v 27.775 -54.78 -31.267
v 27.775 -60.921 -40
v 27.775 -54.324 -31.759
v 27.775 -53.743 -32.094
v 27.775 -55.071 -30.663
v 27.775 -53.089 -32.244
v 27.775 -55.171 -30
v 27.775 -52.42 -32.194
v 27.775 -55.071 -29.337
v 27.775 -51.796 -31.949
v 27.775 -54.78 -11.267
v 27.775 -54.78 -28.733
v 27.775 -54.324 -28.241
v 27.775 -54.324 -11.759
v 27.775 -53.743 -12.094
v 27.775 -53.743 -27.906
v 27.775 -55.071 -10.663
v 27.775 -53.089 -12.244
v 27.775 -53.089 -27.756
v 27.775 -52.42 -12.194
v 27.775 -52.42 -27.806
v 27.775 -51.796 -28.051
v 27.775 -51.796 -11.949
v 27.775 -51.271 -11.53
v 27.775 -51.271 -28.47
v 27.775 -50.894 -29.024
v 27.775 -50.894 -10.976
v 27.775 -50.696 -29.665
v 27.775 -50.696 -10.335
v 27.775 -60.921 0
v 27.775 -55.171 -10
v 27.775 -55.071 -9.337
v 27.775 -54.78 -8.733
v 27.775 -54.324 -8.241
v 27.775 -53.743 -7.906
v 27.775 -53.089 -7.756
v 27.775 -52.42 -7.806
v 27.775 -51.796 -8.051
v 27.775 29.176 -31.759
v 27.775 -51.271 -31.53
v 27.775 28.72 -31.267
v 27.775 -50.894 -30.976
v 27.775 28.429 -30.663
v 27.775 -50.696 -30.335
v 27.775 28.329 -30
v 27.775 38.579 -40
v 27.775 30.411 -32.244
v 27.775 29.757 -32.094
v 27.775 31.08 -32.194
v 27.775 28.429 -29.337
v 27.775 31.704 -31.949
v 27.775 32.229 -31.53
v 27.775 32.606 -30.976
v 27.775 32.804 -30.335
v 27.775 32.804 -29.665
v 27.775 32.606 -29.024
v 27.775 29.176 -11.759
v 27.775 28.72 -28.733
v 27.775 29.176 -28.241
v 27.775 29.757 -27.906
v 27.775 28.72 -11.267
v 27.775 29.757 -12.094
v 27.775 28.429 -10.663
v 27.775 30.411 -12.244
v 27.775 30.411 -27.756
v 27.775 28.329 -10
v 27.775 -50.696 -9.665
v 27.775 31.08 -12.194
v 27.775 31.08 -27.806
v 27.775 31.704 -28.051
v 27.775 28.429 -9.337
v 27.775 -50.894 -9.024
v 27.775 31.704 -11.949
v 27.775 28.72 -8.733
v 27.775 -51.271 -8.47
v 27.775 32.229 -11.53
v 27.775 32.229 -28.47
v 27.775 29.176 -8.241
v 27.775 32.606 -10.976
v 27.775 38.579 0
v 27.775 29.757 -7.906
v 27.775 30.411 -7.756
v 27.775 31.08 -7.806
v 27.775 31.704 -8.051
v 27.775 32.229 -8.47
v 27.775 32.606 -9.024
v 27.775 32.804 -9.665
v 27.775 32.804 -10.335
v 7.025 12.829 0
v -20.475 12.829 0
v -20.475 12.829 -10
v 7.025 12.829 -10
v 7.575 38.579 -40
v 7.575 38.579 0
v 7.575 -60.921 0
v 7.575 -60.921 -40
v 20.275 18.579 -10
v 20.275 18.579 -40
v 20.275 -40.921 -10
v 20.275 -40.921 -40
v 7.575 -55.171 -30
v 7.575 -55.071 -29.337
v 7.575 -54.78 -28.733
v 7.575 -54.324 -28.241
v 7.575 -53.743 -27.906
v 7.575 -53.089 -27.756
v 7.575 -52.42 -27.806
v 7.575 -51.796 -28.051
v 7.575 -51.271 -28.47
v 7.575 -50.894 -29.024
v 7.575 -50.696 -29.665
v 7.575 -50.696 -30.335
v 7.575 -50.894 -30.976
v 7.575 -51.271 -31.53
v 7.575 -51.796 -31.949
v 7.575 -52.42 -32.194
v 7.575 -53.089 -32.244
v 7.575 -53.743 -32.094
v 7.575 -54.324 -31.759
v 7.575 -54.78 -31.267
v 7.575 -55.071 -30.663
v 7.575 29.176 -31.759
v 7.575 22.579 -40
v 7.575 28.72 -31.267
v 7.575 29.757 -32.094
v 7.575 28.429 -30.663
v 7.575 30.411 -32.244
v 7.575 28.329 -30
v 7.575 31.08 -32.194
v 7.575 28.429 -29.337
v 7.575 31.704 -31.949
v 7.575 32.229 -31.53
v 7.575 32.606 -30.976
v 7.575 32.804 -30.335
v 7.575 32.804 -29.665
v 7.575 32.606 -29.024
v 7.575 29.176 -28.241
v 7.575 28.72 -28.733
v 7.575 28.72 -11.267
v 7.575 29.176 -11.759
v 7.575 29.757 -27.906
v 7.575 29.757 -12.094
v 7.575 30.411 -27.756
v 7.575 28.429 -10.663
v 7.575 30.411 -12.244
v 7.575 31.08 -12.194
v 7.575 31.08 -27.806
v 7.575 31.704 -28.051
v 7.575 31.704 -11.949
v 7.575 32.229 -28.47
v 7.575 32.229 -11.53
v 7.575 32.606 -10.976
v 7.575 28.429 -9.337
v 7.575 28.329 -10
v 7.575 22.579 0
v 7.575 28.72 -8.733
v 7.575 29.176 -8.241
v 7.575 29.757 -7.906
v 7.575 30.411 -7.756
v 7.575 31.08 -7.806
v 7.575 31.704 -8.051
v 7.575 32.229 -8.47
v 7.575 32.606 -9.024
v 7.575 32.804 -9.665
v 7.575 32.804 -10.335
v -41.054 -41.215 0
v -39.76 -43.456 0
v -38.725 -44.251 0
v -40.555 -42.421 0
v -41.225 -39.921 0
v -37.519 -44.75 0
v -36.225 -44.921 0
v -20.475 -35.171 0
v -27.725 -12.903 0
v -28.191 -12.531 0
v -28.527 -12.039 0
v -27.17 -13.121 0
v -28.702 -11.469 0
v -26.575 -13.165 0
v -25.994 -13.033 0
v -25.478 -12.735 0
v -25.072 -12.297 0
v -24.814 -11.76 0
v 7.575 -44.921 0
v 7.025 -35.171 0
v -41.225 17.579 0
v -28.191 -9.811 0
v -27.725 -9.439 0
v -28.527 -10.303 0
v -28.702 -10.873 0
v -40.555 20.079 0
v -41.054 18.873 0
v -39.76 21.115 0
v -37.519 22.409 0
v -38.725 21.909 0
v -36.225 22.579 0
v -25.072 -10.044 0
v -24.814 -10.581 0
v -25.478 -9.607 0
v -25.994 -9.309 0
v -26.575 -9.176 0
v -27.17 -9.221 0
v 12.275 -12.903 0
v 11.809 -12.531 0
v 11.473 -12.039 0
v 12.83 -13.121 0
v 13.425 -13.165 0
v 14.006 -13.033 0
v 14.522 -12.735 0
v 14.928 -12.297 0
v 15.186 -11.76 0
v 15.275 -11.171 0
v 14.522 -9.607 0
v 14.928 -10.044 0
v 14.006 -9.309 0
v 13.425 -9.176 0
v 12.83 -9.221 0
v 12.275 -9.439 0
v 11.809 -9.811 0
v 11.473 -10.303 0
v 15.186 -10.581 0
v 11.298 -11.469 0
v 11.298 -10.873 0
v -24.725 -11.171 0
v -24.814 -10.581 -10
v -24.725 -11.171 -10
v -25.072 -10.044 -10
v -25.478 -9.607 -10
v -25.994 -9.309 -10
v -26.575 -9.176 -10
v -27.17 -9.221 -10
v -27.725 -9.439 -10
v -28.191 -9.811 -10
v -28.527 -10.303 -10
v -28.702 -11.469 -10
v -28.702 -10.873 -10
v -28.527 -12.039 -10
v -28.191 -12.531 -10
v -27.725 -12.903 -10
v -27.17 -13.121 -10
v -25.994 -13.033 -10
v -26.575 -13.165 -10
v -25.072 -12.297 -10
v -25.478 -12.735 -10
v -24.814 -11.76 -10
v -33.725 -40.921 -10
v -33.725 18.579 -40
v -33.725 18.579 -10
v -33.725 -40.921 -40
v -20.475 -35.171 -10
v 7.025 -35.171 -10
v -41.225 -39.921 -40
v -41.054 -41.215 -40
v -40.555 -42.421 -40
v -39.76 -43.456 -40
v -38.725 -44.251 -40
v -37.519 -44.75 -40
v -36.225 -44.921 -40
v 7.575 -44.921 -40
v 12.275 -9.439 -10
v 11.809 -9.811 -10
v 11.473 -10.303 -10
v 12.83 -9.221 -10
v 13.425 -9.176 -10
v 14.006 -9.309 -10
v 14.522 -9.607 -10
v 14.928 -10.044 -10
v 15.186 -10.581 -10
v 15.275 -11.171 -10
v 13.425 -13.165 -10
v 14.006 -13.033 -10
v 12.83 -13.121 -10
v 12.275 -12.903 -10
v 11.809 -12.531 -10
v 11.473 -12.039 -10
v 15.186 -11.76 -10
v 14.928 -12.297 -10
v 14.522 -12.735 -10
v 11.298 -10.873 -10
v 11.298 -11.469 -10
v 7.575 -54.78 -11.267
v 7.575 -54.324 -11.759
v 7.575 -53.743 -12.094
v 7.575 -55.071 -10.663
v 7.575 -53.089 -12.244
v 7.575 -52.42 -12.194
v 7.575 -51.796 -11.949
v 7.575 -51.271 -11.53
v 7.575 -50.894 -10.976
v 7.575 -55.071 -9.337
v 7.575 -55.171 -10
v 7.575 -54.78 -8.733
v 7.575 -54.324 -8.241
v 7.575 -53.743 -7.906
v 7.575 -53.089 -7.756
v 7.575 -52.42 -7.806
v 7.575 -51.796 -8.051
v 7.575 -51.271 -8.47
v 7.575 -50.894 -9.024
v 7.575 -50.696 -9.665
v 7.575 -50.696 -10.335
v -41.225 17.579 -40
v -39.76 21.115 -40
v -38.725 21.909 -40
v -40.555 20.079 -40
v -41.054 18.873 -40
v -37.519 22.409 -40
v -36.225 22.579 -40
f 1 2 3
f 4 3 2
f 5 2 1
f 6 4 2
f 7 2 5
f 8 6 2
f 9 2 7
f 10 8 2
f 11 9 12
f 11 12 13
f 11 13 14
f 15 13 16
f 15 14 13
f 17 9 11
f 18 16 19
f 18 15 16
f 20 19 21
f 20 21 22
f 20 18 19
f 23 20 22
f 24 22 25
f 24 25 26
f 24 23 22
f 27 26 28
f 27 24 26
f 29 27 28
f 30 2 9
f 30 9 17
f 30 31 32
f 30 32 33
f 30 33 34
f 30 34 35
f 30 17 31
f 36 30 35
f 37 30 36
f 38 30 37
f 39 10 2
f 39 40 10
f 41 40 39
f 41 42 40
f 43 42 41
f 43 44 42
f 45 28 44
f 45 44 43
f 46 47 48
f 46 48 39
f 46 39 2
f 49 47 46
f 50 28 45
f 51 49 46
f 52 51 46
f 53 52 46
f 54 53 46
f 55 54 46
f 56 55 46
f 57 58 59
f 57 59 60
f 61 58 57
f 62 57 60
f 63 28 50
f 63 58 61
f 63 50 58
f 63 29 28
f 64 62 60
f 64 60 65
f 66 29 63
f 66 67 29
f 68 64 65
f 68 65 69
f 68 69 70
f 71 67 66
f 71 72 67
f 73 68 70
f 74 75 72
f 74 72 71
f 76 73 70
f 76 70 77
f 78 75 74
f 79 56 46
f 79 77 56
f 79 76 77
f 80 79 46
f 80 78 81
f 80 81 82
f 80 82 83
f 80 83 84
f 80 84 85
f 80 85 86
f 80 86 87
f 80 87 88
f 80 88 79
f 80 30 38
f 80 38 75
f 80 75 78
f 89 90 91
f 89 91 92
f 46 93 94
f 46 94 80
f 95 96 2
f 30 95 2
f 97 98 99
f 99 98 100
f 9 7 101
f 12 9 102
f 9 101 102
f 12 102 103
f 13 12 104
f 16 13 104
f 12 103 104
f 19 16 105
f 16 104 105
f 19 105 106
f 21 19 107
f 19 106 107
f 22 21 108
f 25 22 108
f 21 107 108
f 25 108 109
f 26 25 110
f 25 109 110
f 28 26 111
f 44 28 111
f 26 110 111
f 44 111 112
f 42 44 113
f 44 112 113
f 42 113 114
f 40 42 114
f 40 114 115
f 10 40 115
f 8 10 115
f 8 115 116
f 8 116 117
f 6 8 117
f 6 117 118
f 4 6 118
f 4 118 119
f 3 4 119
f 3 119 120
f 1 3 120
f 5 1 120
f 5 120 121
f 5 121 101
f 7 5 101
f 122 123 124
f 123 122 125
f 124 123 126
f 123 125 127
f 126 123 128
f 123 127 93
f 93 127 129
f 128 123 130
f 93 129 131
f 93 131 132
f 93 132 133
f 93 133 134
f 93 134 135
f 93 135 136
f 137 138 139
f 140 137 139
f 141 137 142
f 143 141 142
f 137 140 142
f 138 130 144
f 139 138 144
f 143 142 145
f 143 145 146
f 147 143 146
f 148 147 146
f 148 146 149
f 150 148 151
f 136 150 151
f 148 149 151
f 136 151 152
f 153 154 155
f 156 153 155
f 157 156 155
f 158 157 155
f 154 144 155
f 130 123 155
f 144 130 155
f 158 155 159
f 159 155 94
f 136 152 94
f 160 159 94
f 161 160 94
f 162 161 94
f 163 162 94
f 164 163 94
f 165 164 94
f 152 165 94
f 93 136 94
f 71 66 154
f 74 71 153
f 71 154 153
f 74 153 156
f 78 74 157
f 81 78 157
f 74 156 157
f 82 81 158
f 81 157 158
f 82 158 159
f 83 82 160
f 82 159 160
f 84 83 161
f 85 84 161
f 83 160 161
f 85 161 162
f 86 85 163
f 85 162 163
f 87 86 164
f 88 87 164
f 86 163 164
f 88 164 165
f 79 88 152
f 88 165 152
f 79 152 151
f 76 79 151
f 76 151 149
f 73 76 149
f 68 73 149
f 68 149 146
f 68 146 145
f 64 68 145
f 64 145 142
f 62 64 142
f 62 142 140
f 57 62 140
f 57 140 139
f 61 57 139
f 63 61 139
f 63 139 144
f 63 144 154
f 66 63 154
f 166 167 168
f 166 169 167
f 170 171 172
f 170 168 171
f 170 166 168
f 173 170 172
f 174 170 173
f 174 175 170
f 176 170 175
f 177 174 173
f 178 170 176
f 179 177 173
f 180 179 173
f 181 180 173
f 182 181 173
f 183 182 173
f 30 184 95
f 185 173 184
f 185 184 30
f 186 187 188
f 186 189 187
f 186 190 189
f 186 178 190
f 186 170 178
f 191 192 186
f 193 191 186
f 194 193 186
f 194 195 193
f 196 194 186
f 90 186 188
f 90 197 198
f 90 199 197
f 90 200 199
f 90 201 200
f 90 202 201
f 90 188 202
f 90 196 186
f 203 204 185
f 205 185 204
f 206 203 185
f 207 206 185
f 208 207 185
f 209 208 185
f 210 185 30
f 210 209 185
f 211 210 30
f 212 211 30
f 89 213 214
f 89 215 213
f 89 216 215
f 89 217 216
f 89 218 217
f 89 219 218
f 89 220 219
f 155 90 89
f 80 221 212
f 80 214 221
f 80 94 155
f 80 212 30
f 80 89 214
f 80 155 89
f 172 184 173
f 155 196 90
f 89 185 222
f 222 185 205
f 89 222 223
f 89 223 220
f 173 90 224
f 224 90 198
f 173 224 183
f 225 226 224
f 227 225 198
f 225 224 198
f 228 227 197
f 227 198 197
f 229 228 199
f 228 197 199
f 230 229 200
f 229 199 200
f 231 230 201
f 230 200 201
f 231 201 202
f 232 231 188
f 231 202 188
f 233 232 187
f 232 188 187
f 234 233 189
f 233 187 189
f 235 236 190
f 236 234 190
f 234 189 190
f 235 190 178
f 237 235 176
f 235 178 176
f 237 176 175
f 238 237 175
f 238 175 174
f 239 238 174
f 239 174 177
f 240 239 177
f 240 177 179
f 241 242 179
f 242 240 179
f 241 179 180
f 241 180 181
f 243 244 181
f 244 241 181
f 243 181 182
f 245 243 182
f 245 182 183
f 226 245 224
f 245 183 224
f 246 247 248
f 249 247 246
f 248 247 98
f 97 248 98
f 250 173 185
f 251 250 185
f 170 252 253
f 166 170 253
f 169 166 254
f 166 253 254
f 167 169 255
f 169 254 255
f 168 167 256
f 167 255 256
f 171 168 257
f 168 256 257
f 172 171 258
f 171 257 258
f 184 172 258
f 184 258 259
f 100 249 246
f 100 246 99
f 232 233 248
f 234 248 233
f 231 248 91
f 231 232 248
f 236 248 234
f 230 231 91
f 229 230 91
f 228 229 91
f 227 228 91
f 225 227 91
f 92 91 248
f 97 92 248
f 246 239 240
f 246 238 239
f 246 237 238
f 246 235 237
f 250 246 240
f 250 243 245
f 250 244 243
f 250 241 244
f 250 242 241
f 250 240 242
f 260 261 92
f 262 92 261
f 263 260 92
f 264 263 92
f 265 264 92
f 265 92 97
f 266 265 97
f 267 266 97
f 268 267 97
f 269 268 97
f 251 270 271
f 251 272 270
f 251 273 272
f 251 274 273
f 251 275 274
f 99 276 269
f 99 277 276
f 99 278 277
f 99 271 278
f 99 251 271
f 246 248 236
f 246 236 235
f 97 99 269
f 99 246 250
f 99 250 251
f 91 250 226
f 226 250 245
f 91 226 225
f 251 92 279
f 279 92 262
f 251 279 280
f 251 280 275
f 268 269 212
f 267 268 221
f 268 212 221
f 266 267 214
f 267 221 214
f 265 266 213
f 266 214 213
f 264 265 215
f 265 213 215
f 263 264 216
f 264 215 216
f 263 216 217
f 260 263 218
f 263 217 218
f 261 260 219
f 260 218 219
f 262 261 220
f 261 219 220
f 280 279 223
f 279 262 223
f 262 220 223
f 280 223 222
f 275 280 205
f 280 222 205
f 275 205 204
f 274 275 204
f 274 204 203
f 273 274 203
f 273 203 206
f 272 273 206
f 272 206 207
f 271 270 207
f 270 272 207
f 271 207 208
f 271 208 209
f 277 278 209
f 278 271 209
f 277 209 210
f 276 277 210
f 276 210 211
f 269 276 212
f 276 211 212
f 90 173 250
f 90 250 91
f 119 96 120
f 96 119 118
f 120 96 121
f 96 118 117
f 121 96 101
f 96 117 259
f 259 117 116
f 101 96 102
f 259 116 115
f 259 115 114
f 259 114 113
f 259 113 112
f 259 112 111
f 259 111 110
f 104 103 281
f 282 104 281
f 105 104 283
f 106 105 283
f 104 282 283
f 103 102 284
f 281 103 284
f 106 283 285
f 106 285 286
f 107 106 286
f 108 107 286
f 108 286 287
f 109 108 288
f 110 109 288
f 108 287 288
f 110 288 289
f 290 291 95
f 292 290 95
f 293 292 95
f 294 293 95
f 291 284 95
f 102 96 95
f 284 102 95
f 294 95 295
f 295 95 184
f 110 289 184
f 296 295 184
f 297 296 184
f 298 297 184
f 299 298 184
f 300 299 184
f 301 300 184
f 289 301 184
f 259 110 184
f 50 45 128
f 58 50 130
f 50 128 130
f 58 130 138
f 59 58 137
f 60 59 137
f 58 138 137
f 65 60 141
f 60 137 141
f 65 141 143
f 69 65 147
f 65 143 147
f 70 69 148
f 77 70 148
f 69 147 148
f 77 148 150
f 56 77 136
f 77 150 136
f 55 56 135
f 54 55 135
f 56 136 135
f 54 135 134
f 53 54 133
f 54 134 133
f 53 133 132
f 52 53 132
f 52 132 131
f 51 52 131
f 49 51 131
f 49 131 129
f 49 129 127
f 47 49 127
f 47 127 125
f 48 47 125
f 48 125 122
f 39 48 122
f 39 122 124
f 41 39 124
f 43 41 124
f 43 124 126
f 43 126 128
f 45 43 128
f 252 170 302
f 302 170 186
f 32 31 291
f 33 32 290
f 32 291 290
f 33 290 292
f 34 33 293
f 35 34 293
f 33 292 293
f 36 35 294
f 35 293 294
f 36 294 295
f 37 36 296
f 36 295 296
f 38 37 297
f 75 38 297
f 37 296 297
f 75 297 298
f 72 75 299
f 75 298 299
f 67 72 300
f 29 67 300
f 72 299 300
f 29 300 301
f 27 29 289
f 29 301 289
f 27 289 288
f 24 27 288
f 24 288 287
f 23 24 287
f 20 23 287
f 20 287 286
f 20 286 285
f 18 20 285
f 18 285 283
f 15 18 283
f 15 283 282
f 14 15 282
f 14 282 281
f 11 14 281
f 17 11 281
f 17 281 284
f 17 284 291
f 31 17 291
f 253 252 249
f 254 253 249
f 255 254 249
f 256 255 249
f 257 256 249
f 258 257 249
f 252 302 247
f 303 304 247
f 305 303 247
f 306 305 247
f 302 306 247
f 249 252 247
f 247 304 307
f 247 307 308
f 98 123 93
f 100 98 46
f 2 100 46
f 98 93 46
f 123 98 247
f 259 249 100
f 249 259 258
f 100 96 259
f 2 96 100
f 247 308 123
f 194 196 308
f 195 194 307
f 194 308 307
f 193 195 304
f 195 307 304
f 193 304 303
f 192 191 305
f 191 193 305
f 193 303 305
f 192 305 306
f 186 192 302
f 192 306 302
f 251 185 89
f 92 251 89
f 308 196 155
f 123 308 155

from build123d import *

# Parameters (mm, degrees)
F0_R      = 2
F0_W      = 27.5
F0_H      = 48
F1_DEPTH  = 1
F0_W_2    = 69
F0_H_2    = 99.5
F2_DEPTH  = 40
F3_W      = 54
F3_H      = 59.5
F3_R      = 2
F3_W_2    = 27.5
F3_H_2    = 48
F4_DEPTH  = 30
F5_W      = 48.8
F5_H      = 16
F6_DEPTH  = 40.001
F7_R      = 2.25
F8_DEPTH  = 20.201
F9_DEPTH  = 1
F11_DEPTH = 40.001


with BuildPart() as f1:
    # F0 (on Top) → F1 (new body)
    with BuildSketch(Plane.XY):
        Polygon((7.5751999344, 18.5791517273), (-21.0248000656, 18.5791517273), (-31.2248000656, -11.1708482727), (-21.0248000656, -40.9208482727), (7.5751999344, -40.9208482727), (17.7751999344, -11.1708482727), align=None)
        with Locations((-26.7248000656, -11.1708482727)):
            Circle(F0_R, mode=Mode.SUBTRACT)
        with Locations((-6.7248000656, -11.1708482727)):
            Rectangle(F0_W, F0_H, mode=Mode.SUBTRACT)
        with Locations((13.2751999344, -11.1708482727)):
            Circle(F0_R, mode=Mode.SUBTRACT)
    extrude(amount=F1_DEPTH)

    # F0 (on Top) → F2 (join)
    with BuildSketch(Plane.XY):
        with Locations((-6.7248000656, -11.1708482727)):
            Rectangle(F0_W_2, F0_H_2)
        Polygon((-31.2248000656, -11.1708482727), (-21.0248000656, 18.5791517273), (7.5751999344, 18.5791517273), (17.7751999344, -11.1708482727), (7.5751999344, -40.9208482727), (-21.0248000656, -40.9208482727), align=None, mode=Mode.SUBTRACT)
        Polygon((7.5751999344, 18.5791517273), (-21.0248000656, 18.5791517273), (-31.2248000656, -11.1708482727), (-21.0248000656, -40.9208482727), (7.5751999344, -40.9208482727), (17.7751999344, -11.1708482727), align=None)
        with Locations((-26.7248000656, -11.1708482727)):
            Circle(F0_R, mode=Mode.SUBTRACT)
        with Locations((-6.7248000656, -11.1708482727)):
            Rectangle(F0_W, F0_H, mode=Mode.SUBTRACT)
        with Locations((13.2751999344, -11.1708482727)):
            Circle(F0_R, mode=Mode.SUBTRACT)
    extrude(amount=-F2_DEPTH)

    # F3 (on face) → F4 (cut)
    with BuildSketch(Plane(origin=(0, 0, -40), x_dir=(1, 0, 0), z_dir=(0, 0, -1))):
        with Locations((-6.7248000656, 11.1708482727)):
            Rectangle(F3_W, F3_H)
        with Locations((-26.7248000656, 11.1708482727)):
            Circle(F3_R, mode=Mode.SUBTRACT)
        with Locations((-6.7248000656, 11.1708482727)):
            Rectangle(F3_W_2, F3_H_2, mode=Mode.SUBTRACT)
        with Locations((13.2751999344, 11.1708482727)):
            Circle(F3_R, mode=Mode.SUBTRACT)
    extrude(amount=-F4_DEPTH, mode=Mode.SUBTRACT)

    # F5 (on face) → F6 (cut, through all)
    with BuildSketch(Plane.XY):
        with Locations((-16.8248000656, -52.9208482727)):
            Rectangle(F5_W, F5_H)
        with Locations((-16.8248000656, 30.5791517273)):
            Rectangle(F5_W, F5_H)
    extrude(amount=-F6_DEPTH, mode=Mode.SUBTRACT)

    # F7 (on face) → F8 (cut, through all)
    with BuildSketch(Plane(origin=(7.5751999344, 0, 0), x_dir=(0, -1, 0), z_dir=(-1, 0, 0))):
        with Locations((52.9208482727, -10)):
            Circle(F7_R)
        with Locations((52.9208482727, -30)):
            Circle(F7_R)
        with Locations((-30.5791517273, -10)):
            Circle(F7_R)
        with Locations((-30.5791517273, -30)):
            Circle(F7_R)
    extrude(amount=-F8_DEPTH, mode=Mode.SUBTRACT)

    # F9 (cut): a face of the model
    f9_faces = [f1.faces().sort_by_distance(p)[0] for p in [
        (-6.7248000656, 17.8083566832, 1),
    ]]
    extrude(f9_faces, amount=-F9_DEPTH, mode=Mode.SUBTRACT)

    # F10 (on face) → F11 (cut, through all)
    with BuildSketch(Plane(origin=(0, 0, -40), x_dir=(1, 0, 0), z_dir=(0, 0, -1))):
        with BuildLine():
            ThreePointArc((-41.2248000656, 39.9208482727), (-39.7603339715, 43.4563821787), (-36.2248000656, 44.9208482727))
            Line((-36.2248000656, 44.9208482727), (-41.2248000656, 44.9208482727))
            Line((-41.2248000656, 44.9208482727), (-41.2248000656, 39.9208482727))
        make_face()
        with BuildLine():
            ThreePointArc((-36.2248000656, -22.5791517273), (-39.7603339715, -21.1146856332), (-41.2248000656, -17.5791517273))
            Line((-41.2248000656, -17.5791517273), (-41.2248000656, -22.5791517273))
            Line((-41.2248000656, -22.5791517273), (-36.2248000656, -22.5791517273))
        make_face()
    extrude(amount=-F11_DEPTH, mode=Mode.SUBTRACT)


solid = f1.part
